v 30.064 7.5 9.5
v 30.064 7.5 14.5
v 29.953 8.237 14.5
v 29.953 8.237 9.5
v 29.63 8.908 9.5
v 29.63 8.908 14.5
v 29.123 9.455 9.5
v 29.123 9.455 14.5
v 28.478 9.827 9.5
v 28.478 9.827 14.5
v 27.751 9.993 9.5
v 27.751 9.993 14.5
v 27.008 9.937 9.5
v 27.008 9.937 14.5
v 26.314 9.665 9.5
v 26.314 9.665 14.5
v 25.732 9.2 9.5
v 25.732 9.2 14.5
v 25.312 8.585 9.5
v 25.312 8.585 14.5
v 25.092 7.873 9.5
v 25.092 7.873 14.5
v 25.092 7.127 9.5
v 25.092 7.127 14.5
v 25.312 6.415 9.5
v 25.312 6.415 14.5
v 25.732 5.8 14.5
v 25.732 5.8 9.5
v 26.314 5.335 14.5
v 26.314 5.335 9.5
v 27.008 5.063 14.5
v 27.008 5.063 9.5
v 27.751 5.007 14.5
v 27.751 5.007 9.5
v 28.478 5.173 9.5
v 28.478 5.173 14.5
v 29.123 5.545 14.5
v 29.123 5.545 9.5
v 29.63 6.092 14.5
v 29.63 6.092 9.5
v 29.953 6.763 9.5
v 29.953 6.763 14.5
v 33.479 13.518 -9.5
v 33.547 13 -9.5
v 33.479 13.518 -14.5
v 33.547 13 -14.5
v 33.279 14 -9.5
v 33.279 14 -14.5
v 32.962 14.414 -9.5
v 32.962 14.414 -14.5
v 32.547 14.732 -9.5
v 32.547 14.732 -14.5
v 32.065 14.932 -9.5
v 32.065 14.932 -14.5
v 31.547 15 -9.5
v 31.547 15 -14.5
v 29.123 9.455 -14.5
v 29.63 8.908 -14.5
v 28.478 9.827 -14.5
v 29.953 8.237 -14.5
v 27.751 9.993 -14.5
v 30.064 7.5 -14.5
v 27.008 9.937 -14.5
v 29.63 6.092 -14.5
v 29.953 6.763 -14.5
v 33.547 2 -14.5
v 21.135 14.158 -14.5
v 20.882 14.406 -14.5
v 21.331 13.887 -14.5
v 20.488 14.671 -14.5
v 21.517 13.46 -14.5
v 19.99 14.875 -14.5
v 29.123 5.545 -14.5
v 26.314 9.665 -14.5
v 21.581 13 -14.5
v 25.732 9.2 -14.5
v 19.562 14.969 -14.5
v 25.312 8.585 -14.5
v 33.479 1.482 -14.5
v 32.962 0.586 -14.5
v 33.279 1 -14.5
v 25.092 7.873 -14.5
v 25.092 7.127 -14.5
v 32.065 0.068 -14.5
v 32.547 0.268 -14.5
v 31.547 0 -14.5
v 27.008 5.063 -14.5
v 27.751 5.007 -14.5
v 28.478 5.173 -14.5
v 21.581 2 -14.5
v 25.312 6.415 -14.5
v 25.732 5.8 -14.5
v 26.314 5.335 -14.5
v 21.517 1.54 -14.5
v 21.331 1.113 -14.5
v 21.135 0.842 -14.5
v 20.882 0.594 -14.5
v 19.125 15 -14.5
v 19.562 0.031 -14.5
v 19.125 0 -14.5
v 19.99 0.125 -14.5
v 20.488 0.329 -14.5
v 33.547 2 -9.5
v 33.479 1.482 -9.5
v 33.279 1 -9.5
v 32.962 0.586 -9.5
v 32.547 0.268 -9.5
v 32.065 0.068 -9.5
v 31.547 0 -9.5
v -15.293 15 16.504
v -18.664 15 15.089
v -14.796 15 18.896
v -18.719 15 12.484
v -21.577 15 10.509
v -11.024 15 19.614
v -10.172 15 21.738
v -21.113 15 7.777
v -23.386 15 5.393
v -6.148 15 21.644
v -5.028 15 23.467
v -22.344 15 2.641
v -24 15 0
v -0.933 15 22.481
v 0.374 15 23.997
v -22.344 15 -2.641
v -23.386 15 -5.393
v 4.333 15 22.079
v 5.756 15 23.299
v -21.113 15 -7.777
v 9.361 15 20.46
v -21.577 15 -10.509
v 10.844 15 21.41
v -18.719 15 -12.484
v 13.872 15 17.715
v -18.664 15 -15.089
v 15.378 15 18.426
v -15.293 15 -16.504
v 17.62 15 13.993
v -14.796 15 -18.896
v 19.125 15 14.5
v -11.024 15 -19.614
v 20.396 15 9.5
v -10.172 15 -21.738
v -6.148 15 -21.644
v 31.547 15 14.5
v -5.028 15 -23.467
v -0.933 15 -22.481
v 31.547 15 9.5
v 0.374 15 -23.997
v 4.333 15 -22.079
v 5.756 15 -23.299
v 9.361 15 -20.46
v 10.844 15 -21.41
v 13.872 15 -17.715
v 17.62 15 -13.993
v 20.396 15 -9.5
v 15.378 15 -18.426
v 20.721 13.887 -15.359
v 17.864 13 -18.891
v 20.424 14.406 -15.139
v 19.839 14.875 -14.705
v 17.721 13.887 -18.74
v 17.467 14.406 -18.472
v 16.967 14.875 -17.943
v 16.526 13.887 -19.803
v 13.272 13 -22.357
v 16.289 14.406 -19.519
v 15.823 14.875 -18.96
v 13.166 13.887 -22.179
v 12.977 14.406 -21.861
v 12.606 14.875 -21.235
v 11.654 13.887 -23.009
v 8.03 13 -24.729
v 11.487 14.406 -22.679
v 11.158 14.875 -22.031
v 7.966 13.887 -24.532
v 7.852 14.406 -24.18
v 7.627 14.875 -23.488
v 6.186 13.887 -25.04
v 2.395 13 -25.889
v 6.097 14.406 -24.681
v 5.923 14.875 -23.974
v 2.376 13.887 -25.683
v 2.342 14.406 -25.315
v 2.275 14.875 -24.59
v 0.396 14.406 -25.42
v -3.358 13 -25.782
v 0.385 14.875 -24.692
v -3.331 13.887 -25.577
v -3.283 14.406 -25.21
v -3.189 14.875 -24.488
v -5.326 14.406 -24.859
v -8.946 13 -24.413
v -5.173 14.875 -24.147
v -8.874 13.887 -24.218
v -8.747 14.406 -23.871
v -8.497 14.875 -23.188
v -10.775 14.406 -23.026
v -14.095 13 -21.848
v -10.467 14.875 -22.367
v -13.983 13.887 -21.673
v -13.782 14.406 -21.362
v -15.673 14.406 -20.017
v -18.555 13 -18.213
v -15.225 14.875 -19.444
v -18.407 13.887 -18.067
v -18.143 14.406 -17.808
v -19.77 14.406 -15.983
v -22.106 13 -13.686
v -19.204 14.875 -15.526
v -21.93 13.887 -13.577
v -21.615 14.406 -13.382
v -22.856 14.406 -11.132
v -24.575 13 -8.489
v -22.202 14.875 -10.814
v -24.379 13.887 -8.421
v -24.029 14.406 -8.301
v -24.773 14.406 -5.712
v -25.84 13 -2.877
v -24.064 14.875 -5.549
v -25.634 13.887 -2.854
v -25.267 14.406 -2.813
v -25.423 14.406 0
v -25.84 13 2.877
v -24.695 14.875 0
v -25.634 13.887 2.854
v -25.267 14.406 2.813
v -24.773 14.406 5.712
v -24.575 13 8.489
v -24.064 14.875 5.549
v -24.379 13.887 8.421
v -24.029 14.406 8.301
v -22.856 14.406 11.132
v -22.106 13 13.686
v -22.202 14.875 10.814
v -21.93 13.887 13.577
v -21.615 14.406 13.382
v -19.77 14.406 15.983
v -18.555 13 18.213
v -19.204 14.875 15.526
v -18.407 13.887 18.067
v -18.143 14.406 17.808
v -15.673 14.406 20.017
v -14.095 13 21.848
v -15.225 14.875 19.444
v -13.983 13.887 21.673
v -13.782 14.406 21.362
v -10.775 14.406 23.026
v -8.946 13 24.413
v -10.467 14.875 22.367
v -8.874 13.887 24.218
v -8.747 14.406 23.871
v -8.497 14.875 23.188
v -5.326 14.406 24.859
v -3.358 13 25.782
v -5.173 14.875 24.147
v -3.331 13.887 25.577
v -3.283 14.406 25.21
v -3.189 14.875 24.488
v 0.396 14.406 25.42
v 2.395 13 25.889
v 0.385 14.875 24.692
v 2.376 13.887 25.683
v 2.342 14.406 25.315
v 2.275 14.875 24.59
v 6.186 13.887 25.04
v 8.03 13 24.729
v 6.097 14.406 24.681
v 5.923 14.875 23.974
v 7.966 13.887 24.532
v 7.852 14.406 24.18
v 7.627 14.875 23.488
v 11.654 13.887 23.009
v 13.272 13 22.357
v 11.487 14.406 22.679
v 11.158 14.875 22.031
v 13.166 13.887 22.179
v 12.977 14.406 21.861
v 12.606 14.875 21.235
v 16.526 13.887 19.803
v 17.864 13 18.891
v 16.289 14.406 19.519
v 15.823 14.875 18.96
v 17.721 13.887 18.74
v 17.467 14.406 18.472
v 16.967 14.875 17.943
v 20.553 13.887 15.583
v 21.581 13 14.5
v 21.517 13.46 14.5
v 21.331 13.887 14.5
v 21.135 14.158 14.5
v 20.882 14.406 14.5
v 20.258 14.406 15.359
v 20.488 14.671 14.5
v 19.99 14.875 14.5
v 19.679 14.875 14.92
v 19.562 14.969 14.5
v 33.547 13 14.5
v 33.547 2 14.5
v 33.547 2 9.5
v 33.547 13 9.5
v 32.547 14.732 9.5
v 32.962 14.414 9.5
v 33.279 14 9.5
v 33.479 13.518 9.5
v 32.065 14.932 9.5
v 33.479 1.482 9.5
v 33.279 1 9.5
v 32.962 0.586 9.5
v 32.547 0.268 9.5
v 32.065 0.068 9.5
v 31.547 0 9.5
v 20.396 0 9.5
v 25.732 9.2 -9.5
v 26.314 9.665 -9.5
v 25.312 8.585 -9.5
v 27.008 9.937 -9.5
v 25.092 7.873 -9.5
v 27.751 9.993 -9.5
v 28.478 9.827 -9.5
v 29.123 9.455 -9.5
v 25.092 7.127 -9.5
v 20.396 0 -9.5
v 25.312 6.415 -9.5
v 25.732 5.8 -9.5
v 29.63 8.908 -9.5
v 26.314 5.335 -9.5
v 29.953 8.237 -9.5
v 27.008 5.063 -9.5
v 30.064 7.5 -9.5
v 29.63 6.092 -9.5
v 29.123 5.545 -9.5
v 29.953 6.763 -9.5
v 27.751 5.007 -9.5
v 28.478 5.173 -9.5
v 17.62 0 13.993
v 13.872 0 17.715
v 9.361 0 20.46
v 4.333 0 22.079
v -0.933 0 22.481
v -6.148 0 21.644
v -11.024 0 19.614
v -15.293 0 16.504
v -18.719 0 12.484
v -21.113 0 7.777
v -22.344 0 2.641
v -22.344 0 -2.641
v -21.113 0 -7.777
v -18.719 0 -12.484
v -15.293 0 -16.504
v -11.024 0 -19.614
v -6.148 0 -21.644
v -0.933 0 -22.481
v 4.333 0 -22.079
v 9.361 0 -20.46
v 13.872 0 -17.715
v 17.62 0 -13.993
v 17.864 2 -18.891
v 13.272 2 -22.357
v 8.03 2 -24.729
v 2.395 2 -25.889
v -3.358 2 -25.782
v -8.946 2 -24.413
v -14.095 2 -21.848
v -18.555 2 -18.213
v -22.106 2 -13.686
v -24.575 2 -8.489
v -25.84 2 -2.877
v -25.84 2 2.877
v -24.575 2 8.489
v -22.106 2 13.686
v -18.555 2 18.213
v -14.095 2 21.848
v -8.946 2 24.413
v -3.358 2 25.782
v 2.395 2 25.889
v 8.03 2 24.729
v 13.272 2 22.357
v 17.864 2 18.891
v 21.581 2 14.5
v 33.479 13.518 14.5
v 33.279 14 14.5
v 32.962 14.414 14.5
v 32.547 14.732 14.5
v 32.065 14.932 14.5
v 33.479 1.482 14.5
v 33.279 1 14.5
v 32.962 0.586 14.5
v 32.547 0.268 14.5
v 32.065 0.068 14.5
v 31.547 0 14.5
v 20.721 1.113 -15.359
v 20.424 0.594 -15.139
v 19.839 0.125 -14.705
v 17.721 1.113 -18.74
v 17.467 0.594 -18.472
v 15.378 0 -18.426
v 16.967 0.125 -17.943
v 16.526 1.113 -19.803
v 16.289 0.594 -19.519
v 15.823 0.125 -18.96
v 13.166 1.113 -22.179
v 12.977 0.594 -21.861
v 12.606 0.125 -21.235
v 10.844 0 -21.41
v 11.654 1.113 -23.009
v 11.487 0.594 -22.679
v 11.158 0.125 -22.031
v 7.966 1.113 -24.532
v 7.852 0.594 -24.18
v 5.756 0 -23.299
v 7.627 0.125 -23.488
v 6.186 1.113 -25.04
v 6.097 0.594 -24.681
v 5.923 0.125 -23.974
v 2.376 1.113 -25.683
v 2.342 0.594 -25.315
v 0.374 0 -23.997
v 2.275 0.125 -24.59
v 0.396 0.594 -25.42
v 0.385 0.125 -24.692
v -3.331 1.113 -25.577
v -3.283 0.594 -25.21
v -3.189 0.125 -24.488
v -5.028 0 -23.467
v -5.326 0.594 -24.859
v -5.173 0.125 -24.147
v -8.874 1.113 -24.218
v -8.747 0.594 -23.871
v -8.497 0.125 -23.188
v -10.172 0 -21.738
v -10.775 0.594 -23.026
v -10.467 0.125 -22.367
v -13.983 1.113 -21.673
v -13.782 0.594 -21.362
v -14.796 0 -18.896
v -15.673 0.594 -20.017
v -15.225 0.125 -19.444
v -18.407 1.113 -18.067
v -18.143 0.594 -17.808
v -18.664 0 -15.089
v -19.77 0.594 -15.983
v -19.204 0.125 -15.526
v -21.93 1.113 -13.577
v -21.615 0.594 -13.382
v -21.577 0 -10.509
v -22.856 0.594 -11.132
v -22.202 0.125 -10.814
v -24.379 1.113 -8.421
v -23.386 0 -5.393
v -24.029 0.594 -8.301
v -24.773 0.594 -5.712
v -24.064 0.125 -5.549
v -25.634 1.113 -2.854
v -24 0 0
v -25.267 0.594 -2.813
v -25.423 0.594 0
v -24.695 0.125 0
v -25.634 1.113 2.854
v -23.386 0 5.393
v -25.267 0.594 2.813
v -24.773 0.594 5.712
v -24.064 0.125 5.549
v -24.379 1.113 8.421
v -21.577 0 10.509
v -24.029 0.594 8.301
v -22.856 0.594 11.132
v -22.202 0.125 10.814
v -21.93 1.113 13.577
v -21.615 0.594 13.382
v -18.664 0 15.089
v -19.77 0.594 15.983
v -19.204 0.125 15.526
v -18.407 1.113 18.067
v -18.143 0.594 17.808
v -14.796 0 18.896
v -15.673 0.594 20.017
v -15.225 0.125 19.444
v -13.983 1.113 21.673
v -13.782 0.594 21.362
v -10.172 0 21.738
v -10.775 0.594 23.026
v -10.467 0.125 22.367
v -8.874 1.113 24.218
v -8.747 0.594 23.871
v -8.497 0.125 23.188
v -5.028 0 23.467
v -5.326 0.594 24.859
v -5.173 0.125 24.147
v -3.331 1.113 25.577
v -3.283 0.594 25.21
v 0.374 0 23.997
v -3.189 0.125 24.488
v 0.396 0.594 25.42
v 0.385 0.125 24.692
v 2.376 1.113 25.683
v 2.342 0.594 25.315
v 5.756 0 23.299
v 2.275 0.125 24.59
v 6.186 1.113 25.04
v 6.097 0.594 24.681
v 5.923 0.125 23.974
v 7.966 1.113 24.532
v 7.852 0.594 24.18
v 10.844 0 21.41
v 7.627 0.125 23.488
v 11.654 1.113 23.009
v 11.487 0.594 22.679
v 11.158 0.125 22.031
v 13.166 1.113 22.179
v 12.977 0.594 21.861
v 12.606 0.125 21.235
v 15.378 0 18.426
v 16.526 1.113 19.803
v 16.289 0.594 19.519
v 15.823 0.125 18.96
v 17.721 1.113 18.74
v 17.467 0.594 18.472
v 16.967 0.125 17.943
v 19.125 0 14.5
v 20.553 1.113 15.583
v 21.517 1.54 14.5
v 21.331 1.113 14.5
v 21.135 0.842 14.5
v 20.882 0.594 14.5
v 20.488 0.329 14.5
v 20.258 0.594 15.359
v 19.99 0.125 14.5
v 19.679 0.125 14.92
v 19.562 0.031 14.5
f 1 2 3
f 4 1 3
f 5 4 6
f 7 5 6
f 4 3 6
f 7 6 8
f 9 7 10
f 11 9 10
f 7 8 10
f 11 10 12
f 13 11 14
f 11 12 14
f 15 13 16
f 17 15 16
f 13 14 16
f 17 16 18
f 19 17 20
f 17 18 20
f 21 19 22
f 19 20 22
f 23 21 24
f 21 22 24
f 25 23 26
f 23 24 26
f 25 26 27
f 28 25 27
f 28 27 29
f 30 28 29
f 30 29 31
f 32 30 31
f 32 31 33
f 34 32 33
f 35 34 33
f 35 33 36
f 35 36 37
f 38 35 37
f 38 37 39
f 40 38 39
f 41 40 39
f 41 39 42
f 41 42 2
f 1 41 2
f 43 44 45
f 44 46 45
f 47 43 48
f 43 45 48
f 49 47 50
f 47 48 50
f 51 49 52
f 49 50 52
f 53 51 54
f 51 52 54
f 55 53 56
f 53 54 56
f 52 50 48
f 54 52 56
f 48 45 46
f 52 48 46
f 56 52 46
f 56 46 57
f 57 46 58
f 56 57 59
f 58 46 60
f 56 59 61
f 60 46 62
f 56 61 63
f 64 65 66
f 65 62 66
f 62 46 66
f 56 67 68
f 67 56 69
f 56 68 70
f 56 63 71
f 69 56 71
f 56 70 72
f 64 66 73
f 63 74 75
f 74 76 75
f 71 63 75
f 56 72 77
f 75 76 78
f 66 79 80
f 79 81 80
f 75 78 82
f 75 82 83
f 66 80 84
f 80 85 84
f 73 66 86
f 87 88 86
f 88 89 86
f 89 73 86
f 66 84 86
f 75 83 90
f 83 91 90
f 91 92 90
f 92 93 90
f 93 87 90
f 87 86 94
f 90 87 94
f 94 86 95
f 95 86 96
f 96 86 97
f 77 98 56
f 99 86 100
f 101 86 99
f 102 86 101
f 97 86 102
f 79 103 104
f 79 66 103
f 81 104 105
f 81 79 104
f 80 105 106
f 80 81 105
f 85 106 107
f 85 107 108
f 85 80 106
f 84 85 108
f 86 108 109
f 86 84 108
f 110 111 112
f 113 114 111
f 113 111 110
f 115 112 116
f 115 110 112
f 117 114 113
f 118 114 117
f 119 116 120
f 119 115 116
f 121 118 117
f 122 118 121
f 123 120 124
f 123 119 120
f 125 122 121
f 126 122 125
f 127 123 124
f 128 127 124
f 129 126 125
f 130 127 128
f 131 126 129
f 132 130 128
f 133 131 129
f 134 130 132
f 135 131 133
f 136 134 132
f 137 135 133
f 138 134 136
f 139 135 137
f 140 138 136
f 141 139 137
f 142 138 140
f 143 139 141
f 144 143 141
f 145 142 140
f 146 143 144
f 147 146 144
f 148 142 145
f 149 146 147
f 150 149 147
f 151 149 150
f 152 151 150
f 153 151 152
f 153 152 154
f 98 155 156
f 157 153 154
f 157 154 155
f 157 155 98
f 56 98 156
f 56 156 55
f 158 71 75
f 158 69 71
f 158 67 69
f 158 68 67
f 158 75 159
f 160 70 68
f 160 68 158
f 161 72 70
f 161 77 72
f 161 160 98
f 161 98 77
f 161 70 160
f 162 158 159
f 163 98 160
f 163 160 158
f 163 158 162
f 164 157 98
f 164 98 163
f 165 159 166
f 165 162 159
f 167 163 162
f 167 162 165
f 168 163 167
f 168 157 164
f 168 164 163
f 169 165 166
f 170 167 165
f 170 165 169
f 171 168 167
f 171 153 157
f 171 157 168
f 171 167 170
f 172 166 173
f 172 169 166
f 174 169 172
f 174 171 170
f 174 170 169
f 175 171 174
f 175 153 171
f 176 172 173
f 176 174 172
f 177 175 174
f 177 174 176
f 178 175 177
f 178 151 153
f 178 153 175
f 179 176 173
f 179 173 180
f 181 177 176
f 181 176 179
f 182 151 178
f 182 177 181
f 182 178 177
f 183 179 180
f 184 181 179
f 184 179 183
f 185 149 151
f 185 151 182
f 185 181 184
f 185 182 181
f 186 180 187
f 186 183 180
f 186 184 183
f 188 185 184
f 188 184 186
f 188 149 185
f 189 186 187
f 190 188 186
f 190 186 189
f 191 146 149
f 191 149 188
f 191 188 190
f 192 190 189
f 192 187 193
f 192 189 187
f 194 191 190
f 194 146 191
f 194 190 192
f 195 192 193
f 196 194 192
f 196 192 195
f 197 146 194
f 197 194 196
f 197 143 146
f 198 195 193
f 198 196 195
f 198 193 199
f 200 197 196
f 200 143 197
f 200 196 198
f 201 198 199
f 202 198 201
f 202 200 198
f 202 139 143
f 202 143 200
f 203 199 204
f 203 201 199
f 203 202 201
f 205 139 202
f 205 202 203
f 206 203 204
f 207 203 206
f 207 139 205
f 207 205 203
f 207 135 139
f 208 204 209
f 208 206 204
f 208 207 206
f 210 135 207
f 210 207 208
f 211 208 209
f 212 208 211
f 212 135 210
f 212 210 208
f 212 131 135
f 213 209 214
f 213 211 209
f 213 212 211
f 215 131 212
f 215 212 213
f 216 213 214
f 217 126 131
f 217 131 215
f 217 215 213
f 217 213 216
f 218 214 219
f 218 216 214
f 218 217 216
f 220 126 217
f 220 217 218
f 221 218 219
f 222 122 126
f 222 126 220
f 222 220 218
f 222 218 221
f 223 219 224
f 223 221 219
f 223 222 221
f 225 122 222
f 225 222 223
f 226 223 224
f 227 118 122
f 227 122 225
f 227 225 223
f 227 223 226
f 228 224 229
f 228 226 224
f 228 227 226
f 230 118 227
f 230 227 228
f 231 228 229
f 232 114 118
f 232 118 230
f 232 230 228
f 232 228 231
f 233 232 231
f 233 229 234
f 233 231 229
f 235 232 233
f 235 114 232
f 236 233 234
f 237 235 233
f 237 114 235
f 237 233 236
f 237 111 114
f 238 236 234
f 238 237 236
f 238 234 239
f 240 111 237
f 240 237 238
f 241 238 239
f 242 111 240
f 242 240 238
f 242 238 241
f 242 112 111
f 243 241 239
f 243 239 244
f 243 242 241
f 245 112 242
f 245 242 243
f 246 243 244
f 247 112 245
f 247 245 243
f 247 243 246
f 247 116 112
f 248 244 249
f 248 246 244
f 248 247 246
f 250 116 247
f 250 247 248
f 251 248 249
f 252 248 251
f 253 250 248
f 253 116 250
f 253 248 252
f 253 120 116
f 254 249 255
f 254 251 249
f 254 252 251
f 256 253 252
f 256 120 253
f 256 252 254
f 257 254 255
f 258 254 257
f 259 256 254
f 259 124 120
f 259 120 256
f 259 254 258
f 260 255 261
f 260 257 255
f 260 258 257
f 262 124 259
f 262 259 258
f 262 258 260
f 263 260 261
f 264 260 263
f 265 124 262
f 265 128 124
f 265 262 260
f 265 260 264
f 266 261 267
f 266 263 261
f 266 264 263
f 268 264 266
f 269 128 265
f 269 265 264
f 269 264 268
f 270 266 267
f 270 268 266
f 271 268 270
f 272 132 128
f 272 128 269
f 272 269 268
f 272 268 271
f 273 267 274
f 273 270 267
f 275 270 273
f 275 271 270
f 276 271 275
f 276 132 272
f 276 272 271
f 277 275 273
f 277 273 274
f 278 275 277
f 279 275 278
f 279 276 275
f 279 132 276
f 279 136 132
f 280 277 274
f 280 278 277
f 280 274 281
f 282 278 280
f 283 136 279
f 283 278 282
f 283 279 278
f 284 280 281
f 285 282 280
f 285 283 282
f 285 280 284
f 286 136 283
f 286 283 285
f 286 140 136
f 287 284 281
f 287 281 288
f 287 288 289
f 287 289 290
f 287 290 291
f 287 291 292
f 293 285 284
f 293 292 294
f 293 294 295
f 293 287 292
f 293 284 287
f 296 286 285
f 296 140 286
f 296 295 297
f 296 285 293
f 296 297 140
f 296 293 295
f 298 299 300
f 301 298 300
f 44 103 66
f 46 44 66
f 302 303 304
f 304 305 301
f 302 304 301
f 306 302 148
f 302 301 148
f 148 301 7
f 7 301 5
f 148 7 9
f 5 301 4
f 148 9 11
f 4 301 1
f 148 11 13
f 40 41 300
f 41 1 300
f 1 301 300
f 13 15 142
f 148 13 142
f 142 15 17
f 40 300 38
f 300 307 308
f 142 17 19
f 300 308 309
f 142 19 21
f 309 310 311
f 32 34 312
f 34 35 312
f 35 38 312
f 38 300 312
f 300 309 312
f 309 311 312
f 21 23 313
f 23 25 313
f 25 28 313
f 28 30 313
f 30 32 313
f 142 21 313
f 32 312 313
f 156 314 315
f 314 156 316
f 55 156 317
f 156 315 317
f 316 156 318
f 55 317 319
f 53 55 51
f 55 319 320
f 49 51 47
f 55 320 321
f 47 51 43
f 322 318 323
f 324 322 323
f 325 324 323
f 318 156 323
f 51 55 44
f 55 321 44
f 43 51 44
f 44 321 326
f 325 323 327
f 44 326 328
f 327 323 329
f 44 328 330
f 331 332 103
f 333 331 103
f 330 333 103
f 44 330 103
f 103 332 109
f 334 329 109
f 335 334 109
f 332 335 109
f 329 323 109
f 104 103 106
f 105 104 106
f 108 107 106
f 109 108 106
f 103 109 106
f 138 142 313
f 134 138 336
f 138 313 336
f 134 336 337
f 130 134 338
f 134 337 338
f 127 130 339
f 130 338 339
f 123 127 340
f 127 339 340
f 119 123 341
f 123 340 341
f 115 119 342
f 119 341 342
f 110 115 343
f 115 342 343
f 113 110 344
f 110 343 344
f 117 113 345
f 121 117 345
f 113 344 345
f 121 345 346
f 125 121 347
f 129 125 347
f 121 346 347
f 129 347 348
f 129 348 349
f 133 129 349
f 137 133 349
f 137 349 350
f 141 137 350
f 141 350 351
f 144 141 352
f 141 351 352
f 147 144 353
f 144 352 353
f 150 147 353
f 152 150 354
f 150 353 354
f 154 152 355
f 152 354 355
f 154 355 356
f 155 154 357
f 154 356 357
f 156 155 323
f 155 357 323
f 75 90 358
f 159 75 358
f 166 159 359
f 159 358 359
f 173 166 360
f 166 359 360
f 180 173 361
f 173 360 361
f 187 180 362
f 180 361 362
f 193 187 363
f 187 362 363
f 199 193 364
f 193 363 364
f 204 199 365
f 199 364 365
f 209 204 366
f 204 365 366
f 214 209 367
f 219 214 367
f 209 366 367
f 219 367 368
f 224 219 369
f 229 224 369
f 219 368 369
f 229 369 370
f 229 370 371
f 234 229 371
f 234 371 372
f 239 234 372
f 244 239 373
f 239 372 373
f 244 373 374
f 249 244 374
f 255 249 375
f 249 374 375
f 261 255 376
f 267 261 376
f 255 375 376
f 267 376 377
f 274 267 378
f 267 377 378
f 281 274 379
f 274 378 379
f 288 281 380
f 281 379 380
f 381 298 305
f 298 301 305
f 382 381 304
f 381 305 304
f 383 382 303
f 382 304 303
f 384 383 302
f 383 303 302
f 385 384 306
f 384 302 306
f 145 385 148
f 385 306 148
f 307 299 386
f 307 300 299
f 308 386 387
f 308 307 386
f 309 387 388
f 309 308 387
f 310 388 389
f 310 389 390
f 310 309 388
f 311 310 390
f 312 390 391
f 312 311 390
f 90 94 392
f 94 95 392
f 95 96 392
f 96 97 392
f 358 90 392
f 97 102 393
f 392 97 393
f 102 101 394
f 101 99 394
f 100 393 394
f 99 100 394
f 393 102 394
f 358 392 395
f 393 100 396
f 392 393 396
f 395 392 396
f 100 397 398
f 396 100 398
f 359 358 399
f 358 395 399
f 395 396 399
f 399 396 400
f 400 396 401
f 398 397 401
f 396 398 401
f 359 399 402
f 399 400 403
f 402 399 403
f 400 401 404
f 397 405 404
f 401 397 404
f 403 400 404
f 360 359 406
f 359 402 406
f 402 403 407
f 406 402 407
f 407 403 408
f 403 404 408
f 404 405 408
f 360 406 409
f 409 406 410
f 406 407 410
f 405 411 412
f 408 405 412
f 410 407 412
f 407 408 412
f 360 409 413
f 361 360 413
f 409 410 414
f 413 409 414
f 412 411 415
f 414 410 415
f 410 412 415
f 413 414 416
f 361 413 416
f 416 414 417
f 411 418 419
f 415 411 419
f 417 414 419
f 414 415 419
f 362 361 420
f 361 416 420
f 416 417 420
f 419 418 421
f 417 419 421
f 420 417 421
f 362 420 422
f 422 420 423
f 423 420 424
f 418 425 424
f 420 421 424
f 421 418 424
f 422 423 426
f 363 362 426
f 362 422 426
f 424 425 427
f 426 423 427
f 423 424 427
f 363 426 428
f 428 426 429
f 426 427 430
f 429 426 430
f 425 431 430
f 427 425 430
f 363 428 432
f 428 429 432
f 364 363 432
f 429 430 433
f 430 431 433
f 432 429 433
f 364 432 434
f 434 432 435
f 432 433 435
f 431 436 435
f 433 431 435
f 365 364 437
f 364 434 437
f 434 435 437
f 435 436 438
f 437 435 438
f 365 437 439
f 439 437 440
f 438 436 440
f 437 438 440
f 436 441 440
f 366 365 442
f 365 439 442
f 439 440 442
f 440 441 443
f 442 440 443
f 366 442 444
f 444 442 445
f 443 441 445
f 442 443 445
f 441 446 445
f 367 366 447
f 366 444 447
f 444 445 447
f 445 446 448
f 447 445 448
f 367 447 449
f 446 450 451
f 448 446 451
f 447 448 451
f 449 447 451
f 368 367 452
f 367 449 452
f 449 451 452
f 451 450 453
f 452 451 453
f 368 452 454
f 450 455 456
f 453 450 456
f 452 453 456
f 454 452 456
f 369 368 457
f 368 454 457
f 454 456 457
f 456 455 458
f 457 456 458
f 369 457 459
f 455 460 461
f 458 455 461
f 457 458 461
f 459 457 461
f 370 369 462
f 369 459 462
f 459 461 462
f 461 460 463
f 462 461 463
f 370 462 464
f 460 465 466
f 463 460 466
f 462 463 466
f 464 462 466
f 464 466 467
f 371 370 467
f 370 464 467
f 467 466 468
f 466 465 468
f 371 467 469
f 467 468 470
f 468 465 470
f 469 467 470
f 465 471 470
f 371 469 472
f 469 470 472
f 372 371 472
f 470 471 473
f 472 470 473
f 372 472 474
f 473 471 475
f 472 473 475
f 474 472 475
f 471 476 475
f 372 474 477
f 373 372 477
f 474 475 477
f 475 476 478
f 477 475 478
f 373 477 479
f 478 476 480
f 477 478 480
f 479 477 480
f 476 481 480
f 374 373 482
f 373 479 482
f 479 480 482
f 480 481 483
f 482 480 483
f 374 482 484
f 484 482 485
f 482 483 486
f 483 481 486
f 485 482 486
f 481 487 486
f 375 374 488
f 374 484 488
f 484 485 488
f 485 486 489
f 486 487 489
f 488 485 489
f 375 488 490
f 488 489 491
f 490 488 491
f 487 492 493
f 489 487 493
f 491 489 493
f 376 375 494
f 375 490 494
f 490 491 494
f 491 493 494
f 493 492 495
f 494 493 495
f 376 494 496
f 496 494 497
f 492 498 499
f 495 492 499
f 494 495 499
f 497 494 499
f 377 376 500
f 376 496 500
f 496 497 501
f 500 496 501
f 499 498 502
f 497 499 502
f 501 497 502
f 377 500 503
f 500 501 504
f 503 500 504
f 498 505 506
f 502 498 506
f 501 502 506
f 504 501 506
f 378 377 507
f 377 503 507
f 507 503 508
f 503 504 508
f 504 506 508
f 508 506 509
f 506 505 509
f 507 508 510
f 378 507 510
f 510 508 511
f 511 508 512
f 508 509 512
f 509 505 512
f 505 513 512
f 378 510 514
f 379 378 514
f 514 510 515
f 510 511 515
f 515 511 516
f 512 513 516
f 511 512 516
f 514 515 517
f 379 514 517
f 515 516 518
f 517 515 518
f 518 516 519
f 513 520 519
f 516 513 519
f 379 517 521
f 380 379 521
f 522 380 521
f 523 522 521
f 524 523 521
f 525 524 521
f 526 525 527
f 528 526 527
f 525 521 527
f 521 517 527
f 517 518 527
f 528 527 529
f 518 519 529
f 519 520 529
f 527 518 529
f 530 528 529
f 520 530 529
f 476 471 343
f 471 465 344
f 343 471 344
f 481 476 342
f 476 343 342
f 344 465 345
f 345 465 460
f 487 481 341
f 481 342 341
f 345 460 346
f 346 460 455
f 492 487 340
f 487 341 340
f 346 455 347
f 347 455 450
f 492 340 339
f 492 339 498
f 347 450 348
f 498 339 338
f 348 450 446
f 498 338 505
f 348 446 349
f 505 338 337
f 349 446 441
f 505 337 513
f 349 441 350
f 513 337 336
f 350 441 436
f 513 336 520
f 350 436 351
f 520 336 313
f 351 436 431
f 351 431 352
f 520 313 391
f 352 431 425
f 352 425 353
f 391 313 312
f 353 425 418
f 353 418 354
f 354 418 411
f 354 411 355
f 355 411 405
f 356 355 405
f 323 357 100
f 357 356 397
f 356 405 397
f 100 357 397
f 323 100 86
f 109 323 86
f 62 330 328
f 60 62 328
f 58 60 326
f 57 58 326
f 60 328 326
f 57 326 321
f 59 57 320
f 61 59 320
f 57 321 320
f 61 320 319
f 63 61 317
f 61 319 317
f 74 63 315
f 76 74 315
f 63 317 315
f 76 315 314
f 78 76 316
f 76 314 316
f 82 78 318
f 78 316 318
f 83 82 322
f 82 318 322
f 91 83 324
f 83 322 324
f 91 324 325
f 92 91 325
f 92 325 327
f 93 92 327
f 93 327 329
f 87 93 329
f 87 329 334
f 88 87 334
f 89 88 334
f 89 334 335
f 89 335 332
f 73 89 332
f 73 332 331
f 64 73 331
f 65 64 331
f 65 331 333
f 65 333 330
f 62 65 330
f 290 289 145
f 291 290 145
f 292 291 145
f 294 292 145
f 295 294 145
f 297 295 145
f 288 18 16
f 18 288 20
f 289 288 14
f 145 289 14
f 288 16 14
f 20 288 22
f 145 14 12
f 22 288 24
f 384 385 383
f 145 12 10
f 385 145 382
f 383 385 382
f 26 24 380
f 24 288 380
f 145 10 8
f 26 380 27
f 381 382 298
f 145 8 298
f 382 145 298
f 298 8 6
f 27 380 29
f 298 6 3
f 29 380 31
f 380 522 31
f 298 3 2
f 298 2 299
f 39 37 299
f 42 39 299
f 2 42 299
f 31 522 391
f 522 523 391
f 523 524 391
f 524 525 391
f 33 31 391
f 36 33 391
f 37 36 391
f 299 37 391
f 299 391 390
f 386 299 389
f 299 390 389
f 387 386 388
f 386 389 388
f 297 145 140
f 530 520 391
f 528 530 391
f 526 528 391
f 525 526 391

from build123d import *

# Parameters (mm, degrees)
SALIENTE_EXTRUIR1_DEPTH = 15
REDONDEO1_R             = 2
CROQUIS2_R              = 2.5
CORTAR_EXTRUIR1_DEPTH   = 73


# Read off the part's stored shape, not the designer's step: Saliente-Extruir1
with BuildPart() as part:
    # Saliente-Extruir1 outline → Saliente-Extruir1 (new body)
    with BuildSketch(Plane(origin=(0, 0, 0), x_dir=(1, 0, 0), z_dir=(0, 1, 0))):
        with BuildLine():
            Line((33.547312235, 9.5), (33.547312235, 14.5))
            Line((33.547312235, 14.5), (21.581241855, 14.5))
            ThreePointArc((21.581241855, 14.5), (-26, 0), (21.581241855, -14.5))
            Line((21.581241855, -14.5), (33.547312235, -14.5))
            Line((33.547312235, -14.5), (33.547312235, -9.5))
            Line((33.547312235, -9.5), (20.396078054, -9.5))
            ThreePointArc((20.396078054, -9.5), (-22.5, 0), (20.396078054, 9.5))
            Line((20.396078054, 9.5), (33.547312235, 9.5))
        make_face()
    extrude(amount=SALIENTE_EXTRUIR1_DEPTH)

    # Redondeo1
    redondeo1_edges = [part.edges().sort_by_distance(p)[0] for p in [
        (-26, 0, 0),
        (33.547312235, 0, -12),
        (-26, 15, 0),
        (33.547312235, 15, 12),
        (33.547312235, 15, -12),
        (33.547312235, 0, 12),
    ]]
    fillet(redondeo1_edges, radius=REDONDEO1_R)

    # Croquis2 → Cortar-Extruir1 (cut)
    with BuildSketch(Plane.XY.offset(14.5)):
        with Locations((27.564277045, 7.5)):
            Circle(CROQUIS2_R)
    extrude(amount=-CORTAR_EXTRUIR1_DEPTH, mode=Mode.SUBTRACT)


solid = part.part
